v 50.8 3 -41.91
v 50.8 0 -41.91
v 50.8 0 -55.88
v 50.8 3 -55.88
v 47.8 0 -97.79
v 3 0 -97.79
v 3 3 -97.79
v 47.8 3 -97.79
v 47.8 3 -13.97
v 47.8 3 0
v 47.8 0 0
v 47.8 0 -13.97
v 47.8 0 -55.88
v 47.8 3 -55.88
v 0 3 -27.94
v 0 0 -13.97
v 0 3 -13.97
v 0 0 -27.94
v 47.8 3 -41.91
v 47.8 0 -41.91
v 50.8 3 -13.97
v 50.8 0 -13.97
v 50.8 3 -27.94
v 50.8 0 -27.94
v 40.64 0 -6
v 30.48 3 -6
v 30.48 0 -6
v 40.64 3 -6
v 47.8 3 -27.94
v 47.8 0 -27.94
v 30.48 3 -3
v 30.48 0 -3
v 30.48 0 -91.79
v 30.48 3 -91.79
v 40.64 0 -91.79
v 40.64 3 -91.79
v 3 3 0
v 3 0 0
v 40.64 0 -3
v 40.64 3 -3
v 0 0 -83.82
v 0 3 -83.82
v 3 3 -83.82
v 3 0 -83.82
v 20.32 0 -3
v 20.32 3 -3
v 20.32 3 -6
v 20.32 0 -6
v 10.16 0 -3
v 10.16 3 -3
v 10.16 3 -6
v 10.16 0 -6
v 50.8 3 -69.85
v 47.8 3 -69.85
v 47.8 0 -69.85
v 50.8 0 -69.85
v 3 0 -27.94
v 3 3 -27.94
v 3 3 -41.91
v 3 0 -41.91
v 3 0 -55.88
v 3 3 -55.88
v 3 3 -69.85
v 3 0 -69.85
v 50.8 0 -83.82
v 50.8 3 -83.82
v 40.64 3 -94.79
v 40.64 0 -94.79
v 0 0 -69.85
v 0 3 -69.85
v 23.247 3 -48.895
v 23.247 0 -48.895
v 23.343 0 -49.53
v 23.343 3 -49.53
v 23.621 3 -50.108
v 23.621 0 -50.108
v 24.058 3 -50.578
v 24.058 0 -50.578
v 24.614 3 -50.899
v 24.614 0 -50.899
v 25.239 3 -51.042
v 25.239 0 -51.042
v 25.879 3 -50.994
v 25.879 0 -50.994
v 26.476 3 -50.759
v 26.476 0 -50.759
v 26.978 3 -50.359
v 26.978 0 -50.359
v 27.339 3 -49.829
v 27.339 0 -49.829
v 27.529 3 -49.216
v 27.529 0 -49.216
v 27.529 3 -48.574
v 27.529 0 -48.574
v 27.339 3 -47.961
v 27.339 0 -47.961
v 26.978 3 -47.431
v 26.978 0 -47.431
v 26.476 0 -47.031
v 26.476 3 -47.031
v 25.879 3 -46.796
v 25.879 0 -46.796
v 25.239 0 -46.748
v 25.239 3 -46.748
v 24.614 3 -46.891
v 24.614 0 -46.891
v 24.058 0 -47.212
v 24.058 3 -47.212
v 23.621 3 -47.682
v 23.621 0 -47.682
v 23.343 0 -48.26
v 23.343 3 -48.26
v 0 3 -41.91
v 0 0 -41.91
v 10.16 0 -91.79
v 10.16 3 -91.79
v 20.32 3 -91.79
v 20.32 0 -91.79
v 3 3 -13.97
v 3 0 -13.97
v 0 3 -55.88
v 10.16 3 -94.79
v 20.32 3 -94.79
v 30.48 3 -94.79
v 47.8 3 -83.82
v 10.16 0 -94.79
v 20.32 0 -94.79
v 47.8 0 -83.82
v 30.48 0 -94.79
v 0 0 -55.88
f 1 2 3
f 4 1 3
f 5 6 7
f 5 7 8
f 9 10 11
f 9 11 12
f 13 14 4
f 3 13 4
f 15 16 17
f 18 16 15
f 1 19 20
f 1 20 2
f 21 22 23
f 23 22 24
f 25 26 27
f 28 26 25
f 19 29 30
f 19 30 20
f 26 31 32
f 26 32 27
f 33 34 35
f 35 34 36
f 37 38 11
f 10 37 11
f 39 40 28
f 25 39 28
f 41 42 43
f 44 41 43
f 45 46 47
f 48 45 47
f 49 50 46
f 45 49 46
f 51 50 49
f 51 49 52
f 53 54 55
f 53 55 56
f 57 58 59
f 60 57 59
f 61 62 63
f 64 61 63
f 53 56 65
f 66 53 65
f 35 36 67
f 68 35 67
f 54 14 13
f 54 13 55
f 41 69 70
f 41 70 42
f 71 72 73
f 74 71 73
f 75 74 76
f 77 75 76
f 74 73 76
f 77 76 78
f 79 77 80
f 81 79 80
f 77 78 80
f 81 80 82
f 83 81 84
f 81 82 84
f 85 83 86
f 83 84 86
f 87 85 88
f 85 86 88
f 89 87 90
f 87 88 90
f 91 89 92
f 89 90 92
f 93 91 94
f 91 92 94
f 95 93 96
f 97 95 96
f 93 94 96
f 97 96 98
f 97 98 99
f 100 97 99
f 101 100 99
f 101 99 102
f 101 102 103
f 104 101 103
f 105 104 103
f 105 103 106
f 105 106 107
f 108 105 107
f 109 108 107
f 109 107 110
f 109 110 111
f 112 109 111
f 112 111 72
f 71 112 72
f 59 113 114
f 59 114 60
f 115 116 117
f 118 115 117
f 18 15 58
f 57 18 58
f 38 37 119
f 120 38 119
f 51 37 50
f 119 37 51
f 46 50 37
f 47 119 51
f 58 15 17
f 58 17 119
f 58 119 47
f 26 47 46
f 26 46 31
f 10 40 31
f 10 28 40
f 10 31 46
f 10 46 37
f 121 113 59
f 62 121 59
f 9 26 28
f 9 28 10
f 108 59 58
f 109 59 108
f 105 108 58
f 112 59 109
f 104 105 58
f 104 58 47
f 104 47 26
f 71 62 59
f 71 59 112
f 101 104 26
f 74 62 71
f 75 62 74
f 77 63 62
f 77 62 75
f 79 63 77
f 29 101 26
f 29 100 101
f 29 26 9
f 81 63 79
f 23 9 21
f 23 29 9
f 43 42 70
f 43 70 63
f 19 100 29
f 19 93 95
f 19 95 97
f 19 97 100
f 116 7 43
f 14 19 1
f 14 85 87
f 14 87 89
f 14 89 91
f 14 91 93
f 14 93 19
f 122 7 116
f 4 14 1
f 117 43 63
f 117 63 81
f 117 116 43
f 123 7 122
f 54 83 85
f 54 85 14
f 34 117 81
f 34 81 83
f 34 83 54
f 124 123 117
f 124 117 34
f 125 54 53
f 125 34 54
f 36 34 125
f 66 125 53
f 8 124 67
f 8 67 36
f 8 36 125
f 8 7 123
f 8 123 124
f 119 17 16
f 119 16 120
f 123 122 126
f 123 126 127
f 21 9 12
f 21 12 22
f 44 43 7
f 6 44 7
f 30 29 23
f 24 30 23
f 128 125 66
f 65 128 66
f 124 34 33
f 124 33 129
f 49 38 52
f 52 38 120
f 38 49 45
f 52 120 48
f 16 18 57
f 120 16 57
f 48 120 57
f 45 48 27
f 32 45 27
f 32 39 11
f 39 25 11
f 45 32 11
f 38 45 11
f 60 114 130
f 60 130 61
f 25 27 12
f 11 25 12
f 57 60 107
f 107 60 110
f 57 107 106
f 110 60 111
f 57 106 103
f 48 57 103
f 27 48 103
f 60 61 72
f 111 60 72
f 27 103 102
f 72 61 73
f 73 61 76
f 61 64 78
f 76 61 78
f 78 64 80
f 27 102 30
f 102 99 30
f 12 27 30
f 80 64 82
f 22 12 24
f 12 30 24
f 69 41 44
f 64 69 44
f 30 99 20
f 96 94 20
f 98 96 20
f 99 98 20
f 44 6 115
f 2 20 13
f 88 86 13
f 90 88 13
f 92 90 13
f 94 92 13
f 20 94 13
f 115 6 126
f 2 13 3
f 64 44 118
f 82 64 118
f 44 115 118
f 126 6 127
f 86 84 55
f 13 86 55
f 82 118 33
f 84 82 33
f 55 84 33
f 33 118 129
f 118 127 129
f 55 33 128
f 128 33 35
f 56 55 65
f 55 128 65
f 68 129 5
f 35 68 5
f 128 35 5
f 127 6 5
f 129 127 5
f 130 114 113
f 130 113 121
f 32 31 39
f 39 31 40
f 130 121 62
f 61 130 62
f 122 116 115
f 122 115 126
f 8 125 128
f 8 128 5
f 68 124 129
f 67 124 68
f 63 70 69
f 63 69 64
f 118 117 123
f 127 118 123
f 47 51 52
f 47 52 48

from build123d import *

# Parameters (mm, degrees)
SKETCH1_W             = 50.8
SKETCH1_H             = 97.79
BOSS_EXTRUDE1_DEPTH   = 3
SKETCH2_W             = 10.16
SKETCH2_H             = 3
SKETCH2_W_2           = 3
SKETCH2_H_2           = 13.97
CUT_EXTRUDE1_DEPTH    = 4
F_8_CLEARANCE_HOLE2_D = 4.3053


with BuildPart() as part:
    # Sketch1 → Boss-Extrude1 (new body)
    with BuildSketch(Plane(origin=(0, 0, 0), x_dir=(1, 0, 0), z_dir=(0, 1, 0))):
        with Locations((25.4, 48.895)):
            Rectangle(SKETCH1_W, SKETCH1_H)
    extrude(amount=BOSS_EXTRUDE1_DEPTH)

    # Sketch2 → Cut-Extrude1 (cut, through all)
    with BuildSketch(Plane(origin=(0, 3, 0), x_dir=(1, 0, 0), z_dir=(0, 1, 0))):
        with Locations((15.24, 93.29)):
            Rectangle(SKETCH2_W, SKETCH2_H)
        with Locations((35.56, 93.29)):
            Rectangle(SKETCH2_W, SKETCH2_H)
        with Locations((49.3, 90.805)):
            Rectangle(SKETCH2_W_2, SKETCH2_H_2)
        with Locations((49.3, 62.865)):
            Rectangle(SKETCH2_W_2, SKETCH2_H_2)
        with Locations((49.3, 34.925)):
            Rectangle(SKETCH2_W_2, SKETCH2_H_2)
        with Locations((49.3, 6.985)):
            Rectangle(SKETCH2_W_2, SKETCH2_H_2)
        with Locations((35.56, 4.5)):
            Rectangle(SKETCH2_W, SKETCH2_H)
        with Locations((15.24, 4.5)):
            Rectangle(SKETCH2_W, SKETCH2_H)
        with Locations((1.5, 6.985)):
            Rectangle(SKETCH2_W_2, SKETCH2_H_2)
        with Locations((1.5, 34.925)):
            Rectangle(SKETCH2_W_2, SKETCH2_H_2)
        with Locations((1.5, 62.865)):
            Rectangle(SKETCH2_W_2, SKETCH2_H_2)
        with Locations((1.5, 90.805)):
            Rectangle(SKETCH2_W_2, SKETCH2_H_2)
    extrude(amount=-CUT_EXTRUDE1_DEPTH, mode=Mode.SUBTRACT)

    # #8 Clearance Hole2 (through all)
    with Locations(Plane(origin=(0, 3, 0), x_dir=(1, 0, 0), z_dir=(0, 1, 0))):
        with Locations((25.4, 48.895)):
            Hole(F_8_CLEARANCE_HOLE2_D / 2)


solid = part.part
